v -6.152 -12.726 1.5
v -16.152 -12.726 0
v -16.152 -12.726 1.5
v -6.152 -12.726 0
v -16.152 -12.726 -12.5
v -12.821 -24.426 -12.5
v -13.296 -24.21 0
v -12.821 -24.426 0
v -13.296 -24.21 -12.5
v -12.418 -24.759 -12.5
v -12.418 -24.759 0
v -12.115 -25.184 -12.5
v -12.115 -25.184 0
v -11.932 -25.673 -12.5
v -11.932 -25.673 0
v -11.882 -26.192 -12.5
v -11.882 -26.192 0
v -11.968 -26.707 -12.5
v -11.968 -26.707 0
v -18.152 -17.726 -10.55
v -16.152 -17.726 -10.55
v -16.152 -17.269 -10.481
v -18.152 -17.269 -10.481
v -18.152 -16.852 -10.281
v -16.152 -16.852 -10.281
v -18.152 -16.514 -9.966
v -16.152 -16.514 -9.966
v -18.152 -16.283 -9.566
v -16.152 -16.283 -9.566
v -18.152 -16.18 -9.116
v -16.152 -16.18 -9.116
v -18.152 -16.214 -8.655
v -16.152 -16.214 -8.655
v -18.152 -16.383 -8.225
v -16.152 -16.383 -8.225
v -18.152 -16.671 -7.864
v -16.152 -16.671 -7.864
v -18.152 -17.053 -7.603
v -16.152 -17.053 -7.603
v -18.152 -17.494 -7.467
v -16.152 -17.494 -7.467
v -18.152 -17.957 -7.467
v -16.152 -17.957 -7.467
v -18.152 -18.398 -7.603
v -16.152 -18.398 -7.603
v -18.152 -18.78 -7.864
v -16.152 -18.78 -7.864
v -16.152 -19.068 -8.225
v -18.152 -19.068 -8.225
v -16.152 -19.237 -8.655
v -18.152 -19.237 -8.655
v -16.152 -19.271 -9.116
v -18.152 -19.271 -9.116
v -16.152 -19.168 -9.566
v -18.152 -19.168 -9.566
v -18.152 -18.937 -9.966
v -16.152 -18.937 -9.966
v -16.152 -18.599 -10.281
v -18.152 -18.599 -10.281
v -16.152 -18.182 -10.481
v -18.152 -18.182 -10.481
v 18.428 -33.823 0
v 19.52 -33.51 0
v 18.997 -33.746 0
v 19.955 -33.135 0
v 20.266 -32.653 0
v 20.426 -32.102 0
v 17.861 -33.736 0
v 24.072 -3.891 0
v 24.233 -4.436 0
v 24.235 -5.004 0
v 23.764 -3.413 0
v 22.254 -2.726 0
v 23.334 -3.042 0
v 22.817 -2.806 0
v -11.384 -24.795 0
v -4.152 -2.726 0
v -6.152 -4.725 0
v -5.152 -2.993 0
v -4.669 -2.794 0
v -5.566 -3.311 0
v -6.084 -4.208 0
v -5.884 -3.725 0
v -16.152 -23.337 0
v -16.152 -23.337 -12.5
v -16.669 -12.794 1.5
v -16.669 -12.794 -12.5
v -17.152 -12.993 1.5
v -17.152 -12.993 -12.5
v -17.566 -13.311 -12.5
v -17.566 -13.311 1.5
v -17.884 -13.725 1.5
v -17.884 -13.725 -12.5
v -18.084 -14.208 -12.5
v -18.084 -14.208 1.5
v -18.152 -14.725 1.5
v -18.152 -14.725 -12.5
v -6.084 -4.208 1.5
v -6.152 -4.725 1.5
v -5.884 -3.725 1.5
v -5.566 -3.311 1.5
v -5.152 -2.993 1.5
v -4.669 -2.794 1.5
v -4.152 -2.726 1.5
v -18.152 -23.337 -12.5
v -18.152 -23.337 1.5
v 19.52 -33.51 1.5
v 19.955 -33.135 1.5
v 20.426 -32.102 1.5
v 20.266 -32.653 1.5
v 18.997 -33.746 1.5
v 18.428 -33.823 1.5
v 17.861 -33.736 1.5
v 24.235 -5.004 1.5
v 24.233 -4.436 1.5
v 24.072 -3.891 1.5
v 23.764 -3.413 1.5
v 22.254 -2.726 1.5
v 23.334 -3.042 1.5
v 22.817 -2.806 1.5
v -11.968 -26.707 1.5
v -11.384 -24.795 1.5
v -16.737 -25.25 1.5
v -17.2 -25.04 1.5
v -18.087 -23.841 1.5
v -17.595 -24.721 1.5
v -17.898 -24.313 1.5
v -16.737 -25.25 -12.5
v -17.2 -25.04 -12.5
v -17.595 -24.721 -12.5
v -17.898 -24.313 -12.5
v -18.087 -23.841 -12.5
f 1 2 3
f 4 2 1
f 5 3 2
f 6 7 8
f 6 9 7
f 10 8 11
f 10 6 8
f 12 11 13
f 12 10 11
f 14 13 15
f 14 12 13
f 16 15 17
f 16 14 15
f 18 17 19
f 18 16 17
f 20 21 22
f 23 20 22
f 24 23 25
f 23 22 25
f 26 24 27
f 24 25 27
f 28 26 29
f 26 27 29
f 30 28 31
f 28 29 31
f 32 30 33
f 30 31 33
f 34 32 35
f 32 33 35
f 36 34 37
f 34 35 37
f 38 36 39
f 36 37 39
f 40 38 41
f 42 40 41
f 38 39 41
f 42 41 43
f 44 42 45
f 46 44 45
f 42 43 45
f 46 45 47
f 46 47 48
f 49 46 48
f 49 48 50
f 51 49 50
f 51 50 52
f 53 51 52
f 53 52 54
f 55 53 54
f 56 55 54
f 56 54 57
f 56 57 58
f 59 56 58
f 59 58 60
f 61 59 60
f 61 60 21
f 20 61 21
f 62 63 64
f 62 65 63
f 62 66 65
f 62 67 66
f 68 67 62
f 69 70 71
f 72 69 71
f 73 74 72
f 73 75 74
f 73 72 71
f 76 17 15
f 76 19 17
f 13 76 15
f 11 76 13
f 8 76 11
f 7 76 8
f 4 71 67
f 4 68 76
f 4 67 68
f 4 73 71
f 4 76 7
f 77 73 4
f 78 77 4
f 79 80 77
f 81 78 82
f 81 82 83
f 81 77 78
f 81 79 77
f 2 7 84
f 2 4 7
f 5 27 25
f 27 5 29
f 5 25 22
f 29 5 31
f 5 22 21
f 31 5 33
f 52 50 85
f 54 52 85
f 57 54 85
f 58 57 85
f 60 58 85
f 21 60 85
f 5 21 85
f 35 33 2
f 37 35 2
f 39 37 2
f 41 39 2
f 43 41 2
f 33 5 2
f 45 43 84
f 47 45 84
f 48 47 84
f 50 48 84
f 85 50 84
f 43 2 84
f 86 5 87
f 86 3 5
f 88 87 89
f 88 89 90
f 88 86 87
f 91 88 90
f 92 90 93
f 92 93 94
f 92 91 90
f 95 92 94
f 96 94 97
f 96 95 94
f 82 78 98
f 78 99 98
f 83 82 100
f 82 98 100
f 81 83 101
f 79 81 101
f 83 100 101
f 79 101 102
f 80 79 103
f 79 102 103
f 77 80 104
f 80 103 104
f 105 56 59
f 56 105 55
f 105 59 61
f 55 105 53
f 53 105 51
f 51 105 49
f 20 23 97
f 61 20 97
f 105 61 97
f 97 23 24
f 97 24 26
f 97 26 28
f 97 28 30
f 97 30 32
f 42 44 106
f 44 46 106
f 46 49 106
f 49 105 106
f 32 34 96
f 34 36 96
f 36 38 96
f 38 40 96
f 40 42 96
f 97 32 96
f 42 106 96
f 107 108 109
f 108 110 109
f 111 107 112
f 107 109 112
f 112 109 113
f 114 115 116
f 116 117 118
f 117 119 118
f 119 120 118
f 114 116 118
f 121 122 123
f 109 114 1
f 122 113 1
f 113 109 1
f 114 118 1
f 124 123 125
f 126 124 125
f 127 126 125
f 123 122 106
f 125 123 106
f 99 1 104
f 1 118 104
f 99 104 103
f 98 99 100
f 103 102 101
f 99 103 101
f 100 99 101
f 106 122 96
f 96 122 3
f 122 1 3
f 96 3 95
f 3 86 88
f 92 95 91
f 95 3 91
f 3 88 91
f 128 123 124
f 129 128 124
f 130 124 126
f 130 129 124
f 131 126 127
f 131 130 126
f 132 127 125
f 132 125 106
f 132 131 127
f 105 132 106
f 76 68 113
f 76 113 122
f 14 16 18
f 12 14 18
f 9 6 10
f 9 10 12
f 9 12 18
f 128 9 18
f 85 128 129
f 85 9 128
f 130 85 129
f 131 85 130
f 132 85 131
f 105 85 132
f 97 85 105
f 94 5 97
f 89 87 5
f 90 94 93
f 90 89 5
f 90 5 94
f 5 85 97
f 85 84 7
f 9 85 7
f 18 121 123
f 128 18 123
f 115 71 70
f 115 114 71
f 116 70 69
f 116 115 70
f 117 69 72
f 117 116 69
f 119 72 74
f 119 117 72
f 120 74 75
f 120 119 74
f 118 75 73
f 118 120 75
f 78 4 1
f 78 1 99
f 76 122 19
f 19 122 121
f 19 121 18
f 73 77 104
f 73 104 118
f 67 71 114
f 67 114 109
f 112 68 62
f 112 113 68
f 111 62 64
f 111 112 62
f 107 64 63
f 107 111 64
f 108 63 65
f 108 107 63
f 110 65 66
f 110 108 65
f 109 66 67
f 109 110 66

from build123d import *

# Parameters (mm, degrees)
BOSS_EXTRUDE1_DEPTH = 1.5
BOSS_EXTRUDE3_DEPTH = 14
SKETCH6_R           = 1.55
CUT_EXTRUDE1_DEPTH  = 14
FILLET1_R           = 2


with BuildPart() as part:
    # Sketch1 → Boss-Extrude1 (new body)
    with BuildSketch(Plane.XY):
        Polygon((-6.151738777, -2.72550419), (24.554874692, -2.72550419), (20.100451461, -34.420372379), (-18.151738777, -22.72550419), (-18.151738777, -12.72550419), (-6.151738777, -12.72550419), align=None)
    extrude(amount=BOSS_EXTRUDE1_DEPTH)

    # Sketch5 → Boss-Extrude3 (add)
    with BuildSketch(Plane.XY.offset(1.5)):
        Polygon((-16.151738777, -23.336965553), (-11.383691284, -24.794703962), (-11.968434693, -26.707313474), (-18.151738777, -24.816887703), (-18.151738777, -12.72550419), (-16.151738777, -12.72550419), align=None)
    extrude(amount=-BOSS_EXTRUDE3_DEPTH)

    # Sketch6 → Cut-Extrude1 (cut)
    with BuildSketch(Plane(origin=(-16.151738777, 0, 0), x_dir=(0, 0, -1), z_dir=(1, 0, 0))):
        with Locations((9, -17.72550419)):
            Circle(SKETCH6_R)
    extrude(amount=-CUT_EXTRUDE1_DEPTH, mode=Mode.SUBTRACT)

    # Fillet1
    fillet1_edges = [part.edges().sort_by_distance(p)[0] for p in [
        (-18.151738777, -12.72550419, -5.5),
        (-11.383691284, -24.794703962, -6.25),
        (-18.151738777, -24.816887703, -5.5),
        (20.100451461, -34.420372379, 0.75),
        (-6.151738777, -2.72550419, 0.75),
        (24.554874692, -2.72550419, 0.75),
    ]]
    fillet(fillet1_edges, radius=FILLET1_R - 0.0001)  # a hair under: the kernel refuses the full size


solid = part.part
